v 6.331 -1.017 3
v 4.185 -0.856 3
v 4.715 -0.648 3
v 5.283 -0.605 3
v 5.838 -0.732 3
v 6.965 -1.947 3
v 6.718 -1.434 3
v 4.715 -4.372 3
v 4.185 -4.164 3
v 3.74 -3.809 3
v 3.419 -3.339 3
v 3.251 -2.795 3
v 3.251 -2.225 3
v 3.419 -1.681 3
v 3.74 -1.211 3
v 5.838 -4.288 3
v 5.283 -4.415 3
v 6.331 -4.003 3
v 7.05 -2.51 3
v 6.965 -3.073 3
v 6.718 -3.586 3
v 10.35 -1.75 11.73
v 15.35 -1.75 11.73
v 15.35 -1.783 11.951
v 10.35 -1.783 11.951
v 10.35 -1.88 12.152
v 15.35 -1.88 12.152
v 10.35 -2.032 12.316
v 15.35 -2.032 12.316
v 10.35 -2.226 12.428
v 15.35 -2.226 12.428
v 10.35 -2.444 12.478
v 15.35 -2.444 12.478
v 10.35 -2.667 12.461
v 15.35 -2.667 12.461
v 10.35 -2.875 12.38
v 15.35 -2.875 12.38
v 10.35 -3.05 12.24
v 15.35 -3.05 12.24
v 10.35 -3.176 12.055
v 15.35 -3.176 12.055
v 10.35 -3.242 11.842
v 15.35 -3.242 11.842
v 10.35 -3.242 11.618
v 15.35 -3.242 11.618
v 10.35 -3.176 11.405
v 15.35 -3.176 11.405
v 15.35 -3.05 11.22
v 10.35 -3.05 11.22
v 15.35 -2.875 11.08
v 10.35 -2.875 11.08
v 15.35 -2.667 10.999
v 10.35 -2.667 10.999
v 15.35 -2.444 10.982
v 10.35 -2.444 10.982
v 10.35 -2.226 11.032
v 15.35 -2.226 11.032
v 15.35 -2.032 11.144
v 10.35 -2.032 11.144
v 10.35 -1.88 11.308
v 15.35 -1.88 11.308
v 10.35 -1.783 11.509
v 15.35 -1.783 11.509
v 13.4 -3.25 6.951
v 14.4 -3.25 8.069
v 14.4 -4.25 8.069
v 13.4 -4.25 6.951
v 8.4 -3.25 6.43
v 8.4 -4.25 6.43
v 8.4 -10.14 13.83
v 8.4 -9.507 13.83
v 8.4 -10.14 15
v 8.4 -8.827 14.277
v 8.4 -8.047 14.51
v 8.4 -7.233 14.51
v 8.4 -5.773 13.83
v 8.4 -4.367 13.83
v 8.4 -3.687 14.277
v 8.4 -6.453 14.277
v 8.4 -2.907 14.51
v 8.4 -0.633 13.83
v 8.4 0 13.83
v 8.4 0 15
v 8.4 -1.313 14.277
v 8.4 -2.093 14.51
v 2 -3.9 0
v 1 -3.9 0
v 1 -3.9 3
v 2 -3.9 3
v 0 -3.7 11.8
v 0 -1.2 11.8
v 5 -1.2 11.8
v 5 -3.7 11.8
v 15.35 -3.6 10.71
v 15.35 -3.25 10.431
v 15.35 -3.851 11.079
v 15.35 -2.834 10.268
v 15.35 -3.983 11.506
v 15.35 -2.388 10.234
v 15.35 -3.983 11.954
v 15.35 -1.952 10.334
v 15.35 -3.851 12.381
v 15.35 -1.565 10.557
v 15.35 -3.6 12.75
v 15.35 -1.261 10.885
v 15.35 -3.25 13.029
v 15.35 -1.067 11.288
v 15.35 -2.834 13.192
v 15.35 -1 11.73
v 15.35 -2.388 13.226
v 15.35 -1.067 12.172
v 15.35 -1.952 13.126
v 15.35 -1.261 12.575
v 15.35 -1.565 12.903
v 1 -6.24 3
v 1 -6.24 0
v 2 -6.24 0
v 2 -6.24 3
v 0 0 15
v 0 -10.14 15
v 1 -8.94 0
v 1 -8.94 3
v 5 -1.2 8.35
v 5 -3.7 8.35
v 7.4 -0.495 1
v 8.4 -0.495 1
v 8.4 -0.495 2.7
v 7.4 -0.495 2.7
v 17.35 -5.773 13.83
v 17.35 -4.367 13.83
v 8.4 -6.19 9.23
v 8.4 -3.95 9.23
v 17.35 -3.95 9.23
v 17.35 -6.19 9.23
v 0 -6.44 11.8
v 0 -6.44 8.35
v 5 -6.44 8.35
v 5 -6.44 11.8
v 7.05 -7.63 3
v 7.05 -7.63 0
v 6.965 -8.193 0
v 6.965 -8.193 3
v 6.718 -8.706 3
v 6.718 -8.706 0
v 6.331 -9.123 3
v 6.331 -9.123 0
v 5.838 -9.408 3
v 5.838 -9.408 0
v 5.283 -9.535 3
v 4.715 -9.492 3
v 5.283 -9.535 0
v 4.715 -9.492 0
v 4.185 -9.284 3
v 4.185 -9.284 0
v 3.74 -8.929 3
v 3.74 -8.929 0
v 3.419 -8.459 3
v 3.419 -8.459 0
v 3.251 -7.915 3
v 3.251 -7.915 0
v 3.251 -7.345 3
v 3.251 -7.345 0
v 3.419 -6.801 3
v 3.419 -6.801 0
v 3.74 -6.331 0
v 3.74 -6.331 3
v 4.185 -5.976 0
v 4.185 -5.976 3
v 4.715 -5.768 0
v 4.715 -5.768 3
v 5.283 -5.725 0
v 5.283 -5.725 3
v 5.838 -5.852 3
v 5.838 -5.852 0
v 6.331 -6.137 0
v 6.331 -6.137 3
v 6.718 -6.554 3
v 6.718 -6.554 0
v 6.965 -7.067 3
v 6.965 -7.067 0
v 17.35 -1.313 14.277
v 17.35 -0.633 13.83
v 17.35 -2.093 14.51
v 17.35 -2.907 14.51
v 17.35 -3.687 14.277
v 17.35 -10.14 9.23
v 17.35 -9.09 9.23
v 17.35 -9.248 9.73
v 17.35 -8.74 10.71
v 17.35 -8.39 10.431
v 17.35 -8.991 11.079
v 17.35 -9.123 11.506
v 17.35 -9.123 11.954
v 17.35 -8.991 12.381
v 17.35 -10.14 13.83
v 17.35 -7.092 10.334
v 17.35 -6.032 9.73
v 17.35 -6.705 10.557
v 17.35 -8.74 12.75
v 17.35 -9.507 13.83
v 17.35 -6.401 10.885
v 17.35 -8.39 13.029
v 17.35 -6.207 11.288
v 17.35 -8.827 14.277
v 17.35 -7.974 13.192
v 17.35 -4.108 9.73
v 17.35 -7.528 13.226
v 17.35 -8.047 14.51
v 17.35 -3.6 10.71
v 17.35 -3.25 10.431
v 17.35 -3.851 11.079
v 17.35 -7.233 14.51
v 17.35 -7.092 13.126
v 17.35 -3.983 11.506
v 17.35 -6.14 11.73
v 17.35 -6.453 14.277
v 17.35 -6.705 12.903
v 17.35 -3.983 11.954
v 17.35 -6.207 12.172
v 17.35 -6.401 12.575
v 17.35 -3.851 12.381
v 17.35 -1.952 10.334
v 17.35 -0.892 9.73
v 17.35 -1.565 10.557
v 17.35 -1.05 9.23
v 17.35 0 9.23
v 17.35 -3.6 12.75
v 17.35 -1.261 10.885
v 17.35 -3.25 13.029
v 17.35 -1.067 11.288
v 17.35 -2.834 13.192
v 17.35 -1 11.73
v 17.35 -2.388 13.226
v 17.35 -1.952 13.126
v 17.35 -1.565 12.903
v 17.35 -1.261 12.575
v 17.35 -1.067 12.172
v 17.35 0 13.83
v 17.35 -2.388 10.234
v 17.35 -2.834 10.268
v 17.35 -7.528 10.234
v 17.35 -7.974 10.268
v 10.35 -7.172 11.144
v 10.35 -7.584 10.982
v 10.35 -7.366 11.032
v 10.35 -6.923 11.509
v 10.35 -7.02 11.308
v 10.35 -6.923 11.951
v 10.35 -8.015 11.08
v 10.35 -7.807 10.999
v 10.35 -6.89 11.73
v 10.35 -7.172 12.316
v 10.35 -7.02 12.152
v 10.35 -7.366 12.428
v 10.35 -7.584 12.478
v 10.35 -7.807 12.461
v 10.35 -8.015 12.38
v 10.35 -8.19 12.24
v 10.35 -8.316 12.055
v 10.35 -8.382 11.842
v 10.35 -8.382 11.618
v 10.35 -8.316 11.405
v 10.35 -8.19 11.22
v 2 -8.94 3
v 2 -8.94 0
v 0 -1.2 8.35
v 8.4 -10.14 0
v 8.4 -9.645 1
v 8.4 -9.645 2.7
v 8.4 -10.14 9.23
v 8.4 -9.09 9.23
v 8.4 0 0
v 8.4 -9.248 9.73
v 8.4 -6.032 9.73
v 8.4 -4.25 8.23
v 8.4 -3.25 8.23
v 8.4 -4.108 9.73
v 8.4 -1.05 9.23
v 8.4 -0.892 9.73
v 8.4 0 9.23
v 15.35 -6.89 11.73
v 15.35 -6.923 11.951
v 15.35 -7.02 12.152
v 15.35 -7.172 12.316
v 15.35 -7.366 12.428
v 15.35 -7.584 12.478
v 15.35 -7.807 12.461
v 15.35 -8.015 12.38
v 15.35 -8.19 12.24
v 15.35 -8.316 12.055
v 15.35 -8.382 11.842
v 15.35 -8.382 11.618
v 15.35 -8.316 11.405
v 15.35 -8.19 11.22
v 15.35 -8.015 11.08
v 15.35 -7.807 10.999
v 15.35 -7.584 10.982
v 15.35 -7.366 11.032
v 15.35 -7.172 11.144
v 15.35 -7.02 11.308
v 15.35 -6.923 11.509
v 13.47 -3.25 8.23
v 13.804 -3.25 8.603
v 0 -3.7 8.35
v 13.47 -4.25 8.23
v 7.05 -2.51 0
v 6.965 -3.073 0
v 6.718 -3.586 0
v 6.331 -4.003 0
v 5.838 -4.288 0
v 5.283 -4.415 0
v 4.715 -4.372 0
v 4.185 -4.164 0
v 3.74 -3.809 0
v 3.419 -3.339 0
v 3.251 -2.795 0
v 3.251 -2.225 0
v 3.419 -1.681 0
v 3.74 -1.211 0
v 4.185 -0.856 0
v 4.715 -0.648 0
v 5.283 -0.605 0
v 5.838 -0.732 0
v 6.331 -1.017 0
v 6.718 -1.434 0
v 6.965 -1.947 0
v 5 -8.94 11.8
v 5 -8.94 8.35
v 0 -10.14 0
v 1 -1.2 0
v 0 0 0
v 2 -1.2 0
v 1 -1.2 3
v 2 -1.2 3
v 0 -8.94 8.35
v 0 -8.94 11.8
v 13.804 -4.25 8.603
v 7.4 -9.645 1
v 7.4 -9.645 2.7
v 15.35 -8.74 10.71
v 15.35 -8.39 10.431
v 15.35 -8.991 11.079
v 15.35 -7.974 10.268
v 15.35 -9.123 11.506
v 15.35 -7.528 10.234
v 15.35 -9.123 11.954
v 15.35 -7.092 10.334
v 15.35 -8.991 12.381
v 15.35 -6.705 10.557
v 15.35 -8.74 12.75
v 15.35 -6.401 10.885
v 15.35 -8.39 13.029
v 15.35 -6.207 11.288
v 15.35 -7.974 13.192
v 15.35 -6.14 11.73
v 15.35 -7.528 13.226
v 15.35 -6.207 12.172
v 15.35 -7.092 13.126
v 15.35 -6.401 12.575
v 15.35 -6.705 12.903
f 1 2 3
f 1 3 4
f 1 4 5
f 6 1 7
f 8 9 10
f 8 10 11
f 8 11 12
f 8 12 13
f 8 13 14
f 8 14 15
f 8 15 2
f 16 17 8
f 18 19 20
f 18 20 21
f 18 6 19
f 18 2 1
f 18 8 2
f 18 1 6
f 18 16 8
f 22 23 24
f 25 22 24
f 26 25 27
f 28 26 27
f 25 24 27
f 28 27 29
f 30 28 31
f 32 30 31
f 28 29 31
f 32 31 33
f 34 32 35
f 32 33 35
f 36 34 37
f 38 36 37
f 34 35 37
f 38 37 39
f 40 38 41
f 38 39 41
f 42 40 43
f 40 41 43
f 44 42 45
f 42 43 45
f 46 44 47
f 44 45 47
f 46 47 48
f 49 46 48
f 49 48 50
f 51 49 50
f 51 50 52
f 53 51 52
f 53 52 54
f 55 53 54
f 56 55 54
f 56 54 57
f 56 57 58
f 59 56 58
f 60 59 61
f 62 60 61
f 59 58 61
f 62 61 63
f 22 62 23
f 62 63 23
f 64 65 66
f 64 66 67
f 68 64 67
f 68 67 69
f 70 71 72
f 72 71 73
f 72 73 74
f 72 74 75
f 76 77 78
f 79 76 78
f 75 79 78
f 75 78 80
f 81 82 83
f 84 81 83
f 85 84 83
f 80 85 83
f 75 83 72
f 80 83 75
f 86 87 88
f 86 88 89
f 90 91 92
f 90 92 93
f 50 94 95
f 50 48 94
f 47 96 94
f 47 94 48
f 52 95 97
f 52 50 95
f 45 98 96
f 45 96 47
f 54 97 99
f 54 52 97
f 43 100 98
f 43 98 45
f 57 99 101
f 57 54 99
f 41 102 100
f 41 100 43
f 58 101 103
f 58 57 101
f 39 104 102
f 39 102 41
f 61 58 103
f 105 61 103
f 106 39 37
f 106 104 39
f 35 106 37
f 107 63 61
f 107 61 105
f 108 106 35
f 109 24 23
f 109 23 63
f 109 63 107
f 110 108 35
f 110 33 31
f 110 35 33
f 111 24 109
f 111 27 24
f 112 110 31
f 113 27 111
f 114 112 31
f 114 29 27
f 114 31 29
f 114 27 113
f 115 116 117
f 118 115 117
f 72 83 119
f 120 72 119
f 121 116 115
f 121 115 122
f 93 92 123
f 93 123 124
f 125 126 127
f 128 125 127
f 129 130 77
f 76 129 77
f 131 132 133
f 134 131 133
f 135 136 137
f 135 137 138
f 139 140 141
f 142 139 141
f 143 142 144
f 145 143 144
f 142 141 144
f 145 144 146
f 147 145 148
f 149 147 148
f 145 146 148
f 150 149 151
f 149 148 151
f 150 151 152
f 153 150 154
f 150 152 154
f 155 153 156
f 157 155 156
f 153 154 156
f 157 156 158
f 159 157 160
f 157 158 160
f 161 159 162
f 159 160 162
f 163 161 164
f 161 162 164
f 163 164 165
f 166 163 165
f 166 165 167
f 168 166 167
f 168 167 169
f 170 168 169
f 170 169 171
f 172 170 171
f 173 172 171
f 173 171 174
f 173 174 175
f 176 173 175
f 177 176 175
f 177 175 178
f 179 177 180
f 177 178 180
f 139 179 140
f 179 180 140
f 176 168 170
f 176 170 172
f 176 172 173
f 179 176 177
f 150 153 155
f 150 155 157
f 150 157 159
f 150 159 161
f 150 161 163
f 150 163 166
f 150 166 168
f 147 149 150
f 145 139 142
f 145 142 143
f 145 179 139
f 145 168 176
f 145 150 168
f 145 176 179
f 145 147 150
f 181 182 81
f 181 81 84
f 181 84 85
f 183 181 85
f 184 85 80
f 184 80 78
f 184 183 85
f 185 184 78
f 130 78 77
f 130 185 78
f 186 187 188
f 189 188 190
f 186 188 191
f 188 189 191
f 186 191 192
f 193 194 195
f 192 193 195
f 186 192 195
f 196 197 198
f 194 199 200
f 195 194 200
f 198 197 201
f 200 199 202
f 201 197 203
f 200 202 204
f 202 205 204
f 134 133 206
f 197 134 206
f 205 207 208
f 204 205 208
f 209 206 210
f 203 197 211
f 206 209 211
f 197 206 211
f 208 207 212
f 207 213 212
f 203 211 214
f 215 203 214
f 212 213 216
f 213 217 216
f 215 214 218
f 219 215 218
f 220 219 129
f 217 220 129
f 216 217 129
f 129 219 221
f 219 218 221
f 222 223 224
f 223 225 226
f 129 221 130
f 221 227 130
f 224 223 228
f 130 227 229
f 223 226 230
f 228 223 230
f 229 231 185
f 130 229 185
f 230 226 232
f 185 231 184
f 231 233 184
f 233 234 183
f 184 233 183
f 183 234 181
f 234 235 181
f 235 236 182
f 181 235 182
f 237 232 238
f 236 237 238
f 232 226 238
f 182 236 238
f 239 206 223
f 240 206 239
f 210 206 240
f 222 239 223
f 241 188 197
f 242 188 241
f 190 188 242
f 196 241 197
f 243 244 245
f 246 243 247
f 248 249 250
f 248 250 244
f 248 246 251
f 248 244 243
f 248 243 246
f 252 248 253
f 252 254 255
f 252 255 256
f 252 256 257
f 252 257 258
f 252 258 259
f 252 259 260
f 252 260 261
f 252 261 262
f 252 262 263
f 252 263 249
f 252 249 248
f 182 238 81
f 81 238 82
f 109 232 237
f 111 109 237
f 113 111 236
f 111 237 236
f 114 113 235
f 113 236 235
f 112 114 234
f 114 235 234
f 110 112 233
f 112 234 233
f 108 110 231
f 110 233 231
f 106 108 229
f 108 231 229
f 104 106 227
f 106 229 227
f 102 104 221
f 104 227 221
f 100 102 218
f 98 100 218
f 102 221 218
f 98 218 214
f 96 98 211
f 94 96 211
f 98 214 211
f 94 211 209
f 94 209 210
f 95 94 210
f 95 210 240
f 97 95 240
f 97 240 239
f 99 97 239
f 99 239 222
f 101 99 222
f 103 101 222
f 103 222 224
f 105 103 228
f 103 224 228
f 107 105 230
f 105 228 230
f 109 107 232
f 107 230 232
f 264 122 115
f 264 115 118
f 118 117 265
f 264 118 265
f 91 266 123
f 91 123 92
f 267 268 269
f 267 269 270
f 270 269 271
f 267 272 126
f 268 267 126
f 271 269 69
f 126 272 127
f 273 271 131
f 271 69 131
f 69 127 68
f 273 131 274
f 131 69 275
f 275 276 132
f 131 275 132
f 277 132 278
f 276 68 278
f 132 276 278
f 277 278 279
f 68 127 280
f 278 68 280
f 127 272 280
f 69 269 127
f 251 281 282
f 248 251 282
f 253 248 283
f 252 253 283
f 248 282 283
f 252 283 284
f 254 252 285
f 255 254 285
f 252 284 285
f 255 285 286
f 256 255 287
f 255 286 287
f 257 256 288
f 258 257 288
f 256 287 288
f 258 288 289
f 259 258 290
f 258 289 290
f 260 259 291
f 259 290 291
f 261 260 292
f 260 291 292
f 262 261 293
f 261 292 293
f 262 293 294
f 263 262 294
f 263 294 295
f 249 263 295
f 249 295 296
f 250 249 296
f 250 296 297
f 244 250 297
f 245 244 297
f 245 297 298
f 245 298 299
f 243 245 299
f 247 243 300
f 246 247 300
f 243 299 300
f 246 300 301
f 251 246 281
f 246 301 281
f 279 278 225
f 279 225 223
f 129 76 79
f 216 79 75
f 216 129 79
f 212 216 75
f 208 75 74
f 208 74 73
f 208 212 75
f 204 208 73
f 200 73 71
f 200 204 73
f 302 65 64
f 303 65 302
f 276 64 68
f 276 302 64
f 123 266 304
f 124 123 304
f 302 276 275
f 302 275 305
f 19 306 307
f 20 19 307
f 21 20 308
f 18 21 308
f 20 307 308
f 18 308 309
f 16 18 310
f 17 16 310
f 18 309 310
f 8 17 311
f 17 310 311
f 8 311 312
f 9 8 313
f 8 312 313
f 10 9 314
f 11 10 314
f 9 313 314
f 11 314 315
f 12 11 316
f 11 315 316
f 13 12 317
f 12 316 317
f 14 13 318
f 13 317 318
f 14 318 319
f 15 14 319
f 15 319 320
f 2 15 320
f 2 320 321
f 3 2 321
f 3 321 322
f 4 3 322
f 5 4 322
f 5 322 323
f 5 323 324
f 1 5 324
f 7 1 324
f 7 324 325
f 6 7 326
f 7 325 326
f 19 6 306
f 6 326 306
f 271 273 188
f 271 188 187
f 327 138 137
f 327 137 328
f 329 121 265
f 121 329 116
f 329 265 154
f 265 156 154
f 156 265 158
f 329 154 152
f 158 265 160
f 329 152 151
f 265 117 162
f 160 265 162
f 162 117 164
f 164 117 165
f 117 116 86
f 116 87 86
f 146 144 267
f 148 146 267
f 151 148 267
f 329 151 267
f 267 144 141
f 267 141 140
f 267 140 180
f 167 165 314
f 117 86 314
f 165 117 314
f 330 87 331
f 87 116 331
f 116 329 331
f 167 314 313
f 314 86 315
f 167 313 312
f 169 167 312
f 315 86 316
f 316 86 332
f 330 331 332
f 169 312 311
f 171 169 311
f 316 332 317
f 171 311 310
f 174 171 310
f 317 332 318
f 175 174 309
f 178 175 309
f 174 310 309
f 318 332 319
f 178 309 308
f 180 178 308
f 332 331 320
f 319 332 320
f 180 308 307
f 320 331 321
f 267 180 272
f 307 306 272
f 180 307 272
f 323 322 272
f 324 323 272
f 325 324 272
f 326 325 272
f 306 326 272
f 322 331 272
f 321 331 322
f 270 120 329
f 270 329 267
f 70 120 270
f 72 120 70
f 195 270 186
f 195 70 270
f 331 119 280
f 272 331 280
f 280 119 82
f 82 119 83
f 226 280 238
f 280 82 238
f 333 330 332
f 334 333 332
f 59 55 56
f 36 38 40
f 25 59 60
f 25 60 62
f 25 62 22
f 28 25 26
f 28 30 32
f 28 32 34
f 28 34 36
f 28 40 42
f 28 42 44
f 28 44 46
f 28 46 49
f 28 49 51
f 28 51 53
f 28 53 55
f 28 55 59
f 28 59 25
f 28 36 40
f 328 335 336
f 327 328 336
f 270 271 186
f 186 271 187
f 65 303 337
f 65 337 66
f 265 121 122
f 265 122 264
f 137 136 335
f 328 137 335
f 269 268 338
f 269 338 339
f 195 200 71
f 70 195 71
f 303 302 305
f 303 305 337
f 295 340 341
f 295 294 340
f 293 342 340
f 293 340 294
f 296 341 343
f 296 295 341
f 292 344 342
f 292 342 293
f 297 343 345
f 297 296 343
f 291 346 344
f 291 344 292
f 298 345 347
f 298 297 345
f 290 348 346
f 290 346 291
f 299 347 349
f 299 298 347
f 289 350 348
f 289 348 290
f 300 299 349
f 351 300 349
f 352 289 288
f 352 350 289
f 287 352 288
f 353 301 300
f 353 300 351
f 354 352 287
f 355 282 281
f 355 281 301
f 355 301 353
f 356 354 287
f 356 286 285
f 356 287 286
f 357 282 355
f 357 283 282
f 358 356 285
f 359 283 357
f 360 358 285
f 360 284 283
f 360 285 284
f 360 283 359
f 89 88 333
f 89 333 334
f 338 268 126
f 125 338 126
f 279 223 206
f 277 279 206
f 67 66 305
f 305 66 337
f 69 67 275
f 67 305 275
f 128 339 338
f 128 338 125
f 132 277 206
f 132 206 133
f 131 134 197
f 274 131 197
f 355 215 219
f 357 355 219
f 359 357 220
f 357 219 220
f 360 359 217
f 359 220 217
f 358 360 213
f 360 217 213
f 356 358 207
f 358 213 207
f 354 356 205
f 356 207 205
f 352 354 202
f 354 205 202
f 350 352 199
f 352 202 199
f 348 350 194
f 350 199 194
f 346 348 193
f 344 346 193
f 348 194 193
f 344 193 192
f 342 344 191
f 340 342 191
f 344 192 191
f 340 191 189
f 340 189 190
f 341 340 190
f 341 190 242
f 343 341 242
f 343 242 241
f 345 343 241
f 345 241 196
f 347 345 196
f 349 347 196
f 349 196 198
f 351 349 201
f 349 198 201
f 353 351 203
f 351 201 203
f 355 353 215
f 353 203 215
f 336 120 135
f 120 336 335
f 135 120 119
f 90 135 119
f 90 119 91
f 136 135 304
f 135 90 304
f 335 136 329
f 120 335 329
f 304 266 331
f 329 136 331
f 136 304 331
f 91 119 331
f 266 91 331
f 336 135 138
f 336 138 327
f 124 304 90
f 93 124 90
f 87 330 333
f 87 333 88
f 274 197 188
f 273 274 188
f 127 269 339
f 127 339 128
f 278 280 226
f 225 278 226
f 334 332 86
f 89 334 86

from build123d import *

# Parameters (mm, degrees)
F1_DEPTH  = 10.14
F2_R      = 1.91
F2_W      = 1
F2_H      = 2.7
F3_DEPTH  = 3
F4_W      = 2.5
F4_H      = 3.45
F5_DEPTH  = 5
F6_R      = 1.5
F7_DEPTH  = 2
F9_DEPTH  = 8.95
F11_DEPTH = 8.95
F12_R     = 0.75
F13_DEPTH = 5
F14_R     = 0.75
F15_DEPTH = 5
F16_W     = 9.15
F16_H     = 1.7
F17_DEPTH = 1
F20_DEPTH = 1


with BuildPart() as f1:
    # F0 (on Front) → F1 (new body)
    with BuildSketch(Plane.XZ):
        Polygon((8.4, 15), (0, 15), (0, 0), (8.4, 0), (8.4, 9.23), (17.35, 9.23), (17.35, 13.83), (8.4, 13.83), align=None)
    extrude(amount=F1_DEPTH)

    # F2 (on face) → F3 (cut)
    with BuildSketch(Plane(origin=(0, 0, 0), x_dir=(1, 0, 0), z_dir=(0, 0, -1))):
        with Locations((5.14, 2.51)):
            Circle(F2_R)
        with Locations((5.14, 7.63)):
            Circle(F2_R)
        with Locations((1.5, 2.55)):
            Rectangle(F2_W, F2_H)
        with Locations((1.5, 7.59)):
            Rectangle(F2_W, F2_H)
    extrude(amount=-F3_DEPTH, mode=Mode.SUBTRACT)

    # F4 (on face) → F5 (cut)
    with BuildSketch(Plane(origin=(0, 0, 0), x_dir=(0, -1, 0), z_dir=(-1, 0, 0))):
        with Locations((7.69, 10.075)):
            Rectangle(F4_W, F4_H)
        with Locations((2.45, 10.075)):
            Rectangle(F4_W, F4_H)
    extrude(amount=-F5_DEPTH, mode=Mode.SUBTRACT)

    # F6 (on face) → F7 (cut)
    with BuildSketch(Plane.YZ.offset(17.35)):
        with Locations((-2.5, 11.73)):
            Circle(F6_R)
        with Locations((-7.64, 11.73)):
            Circle(F6_R)
    extrude(amount=-F7_DEPTH, mode=Mode.SUBTRACT)

    # F8 (on face) → F9 (cut)
    with BuildSketch(Plane.YZ.offset(17.35)):
        Polygon((-9.2476493944, 9.73), (-9.09, 9.23), (-7.64, 9.23), (-7.64, 9.73), align=None)
        Polygon((-7.64, 9.73), (-7.64, 9.23), (-6.19, 9.23), (-6.0323506056, 9.73), align=None)
        Polygon((-1.05, 9.23), (-0.8923506056, 9.73), (-4.1076493944, 9.73), (-3.95, 9.23), align=None)
    extrude(amount=-F9_DEPTH, mode=Mode.SUBTRACT)

    # F10 (on face) → F11 (join, through all)
    with BuildSketch(Plane.YZ.offset(17.35)):
        with BuildLine():
            Line((-9.5071100664, 13.83), (-5.7728899336, 13.83))
            ThreePointArc((-5.7728899336, 13.83), (-7.64, 14.54), (-9.5071100664, 13.83))
        make_face()
        with BuildLine():
            ThreePointArc((-0.6328899336, 13.83), (-2.5, 14.54), (-4.3671100664, 13.83))
            Line((-4.3671100664, 13.83), (-0.6328899336, 13.83))
        make_face()
    extrude(amount=-F11_DEPTH)

    # F12 (on face) → F13 (cut)
    with BuildSketch(Plane.YZ.offset(15.35)):
        with Locations((-7.64, 11.73)):
            Circle(F12_R)
    extrude(amount=-F13_DEPTH, mode=Mode.SUBTRACT)

    # F14 (on face) → F15 (cut)
    with BuildSketch(Plane.YZ.offset(15.35)):
        with Locations((-2.5, 11.73)):
            Circle(F14_R)
    extrude(amount=-F15_DEPTH, mode=Mode.SUBTRACT)

    # F16 (on face) → F17 (cut)
    with BuildSketch(Plane.YZ.offset(8.4)):
        with Locations((-5.07, 1.85)):
            Rectangle(F16_W, F16_H)
    extrude(amount=-F17_DEPTH, mode=Mode.SUBTRACT)

    # F19 (on offset) → F20 (join)
    with BuildSketch(Plane(origin=(0, -3.25, 0), x_dir=(-1, 0, 0), z_dir=(0, 1, 0))):
        Polygon((-8.4, 6.43), (-8.4, 8.23), (-13.4703818727, 8.23), (-13.803715206, 8.6026779962), (-14.4, 8.0693446629), (-13.4, 6.9513106742), align=None)
    extrude(amount=-F20_DEPTH)


solid = f1.part
